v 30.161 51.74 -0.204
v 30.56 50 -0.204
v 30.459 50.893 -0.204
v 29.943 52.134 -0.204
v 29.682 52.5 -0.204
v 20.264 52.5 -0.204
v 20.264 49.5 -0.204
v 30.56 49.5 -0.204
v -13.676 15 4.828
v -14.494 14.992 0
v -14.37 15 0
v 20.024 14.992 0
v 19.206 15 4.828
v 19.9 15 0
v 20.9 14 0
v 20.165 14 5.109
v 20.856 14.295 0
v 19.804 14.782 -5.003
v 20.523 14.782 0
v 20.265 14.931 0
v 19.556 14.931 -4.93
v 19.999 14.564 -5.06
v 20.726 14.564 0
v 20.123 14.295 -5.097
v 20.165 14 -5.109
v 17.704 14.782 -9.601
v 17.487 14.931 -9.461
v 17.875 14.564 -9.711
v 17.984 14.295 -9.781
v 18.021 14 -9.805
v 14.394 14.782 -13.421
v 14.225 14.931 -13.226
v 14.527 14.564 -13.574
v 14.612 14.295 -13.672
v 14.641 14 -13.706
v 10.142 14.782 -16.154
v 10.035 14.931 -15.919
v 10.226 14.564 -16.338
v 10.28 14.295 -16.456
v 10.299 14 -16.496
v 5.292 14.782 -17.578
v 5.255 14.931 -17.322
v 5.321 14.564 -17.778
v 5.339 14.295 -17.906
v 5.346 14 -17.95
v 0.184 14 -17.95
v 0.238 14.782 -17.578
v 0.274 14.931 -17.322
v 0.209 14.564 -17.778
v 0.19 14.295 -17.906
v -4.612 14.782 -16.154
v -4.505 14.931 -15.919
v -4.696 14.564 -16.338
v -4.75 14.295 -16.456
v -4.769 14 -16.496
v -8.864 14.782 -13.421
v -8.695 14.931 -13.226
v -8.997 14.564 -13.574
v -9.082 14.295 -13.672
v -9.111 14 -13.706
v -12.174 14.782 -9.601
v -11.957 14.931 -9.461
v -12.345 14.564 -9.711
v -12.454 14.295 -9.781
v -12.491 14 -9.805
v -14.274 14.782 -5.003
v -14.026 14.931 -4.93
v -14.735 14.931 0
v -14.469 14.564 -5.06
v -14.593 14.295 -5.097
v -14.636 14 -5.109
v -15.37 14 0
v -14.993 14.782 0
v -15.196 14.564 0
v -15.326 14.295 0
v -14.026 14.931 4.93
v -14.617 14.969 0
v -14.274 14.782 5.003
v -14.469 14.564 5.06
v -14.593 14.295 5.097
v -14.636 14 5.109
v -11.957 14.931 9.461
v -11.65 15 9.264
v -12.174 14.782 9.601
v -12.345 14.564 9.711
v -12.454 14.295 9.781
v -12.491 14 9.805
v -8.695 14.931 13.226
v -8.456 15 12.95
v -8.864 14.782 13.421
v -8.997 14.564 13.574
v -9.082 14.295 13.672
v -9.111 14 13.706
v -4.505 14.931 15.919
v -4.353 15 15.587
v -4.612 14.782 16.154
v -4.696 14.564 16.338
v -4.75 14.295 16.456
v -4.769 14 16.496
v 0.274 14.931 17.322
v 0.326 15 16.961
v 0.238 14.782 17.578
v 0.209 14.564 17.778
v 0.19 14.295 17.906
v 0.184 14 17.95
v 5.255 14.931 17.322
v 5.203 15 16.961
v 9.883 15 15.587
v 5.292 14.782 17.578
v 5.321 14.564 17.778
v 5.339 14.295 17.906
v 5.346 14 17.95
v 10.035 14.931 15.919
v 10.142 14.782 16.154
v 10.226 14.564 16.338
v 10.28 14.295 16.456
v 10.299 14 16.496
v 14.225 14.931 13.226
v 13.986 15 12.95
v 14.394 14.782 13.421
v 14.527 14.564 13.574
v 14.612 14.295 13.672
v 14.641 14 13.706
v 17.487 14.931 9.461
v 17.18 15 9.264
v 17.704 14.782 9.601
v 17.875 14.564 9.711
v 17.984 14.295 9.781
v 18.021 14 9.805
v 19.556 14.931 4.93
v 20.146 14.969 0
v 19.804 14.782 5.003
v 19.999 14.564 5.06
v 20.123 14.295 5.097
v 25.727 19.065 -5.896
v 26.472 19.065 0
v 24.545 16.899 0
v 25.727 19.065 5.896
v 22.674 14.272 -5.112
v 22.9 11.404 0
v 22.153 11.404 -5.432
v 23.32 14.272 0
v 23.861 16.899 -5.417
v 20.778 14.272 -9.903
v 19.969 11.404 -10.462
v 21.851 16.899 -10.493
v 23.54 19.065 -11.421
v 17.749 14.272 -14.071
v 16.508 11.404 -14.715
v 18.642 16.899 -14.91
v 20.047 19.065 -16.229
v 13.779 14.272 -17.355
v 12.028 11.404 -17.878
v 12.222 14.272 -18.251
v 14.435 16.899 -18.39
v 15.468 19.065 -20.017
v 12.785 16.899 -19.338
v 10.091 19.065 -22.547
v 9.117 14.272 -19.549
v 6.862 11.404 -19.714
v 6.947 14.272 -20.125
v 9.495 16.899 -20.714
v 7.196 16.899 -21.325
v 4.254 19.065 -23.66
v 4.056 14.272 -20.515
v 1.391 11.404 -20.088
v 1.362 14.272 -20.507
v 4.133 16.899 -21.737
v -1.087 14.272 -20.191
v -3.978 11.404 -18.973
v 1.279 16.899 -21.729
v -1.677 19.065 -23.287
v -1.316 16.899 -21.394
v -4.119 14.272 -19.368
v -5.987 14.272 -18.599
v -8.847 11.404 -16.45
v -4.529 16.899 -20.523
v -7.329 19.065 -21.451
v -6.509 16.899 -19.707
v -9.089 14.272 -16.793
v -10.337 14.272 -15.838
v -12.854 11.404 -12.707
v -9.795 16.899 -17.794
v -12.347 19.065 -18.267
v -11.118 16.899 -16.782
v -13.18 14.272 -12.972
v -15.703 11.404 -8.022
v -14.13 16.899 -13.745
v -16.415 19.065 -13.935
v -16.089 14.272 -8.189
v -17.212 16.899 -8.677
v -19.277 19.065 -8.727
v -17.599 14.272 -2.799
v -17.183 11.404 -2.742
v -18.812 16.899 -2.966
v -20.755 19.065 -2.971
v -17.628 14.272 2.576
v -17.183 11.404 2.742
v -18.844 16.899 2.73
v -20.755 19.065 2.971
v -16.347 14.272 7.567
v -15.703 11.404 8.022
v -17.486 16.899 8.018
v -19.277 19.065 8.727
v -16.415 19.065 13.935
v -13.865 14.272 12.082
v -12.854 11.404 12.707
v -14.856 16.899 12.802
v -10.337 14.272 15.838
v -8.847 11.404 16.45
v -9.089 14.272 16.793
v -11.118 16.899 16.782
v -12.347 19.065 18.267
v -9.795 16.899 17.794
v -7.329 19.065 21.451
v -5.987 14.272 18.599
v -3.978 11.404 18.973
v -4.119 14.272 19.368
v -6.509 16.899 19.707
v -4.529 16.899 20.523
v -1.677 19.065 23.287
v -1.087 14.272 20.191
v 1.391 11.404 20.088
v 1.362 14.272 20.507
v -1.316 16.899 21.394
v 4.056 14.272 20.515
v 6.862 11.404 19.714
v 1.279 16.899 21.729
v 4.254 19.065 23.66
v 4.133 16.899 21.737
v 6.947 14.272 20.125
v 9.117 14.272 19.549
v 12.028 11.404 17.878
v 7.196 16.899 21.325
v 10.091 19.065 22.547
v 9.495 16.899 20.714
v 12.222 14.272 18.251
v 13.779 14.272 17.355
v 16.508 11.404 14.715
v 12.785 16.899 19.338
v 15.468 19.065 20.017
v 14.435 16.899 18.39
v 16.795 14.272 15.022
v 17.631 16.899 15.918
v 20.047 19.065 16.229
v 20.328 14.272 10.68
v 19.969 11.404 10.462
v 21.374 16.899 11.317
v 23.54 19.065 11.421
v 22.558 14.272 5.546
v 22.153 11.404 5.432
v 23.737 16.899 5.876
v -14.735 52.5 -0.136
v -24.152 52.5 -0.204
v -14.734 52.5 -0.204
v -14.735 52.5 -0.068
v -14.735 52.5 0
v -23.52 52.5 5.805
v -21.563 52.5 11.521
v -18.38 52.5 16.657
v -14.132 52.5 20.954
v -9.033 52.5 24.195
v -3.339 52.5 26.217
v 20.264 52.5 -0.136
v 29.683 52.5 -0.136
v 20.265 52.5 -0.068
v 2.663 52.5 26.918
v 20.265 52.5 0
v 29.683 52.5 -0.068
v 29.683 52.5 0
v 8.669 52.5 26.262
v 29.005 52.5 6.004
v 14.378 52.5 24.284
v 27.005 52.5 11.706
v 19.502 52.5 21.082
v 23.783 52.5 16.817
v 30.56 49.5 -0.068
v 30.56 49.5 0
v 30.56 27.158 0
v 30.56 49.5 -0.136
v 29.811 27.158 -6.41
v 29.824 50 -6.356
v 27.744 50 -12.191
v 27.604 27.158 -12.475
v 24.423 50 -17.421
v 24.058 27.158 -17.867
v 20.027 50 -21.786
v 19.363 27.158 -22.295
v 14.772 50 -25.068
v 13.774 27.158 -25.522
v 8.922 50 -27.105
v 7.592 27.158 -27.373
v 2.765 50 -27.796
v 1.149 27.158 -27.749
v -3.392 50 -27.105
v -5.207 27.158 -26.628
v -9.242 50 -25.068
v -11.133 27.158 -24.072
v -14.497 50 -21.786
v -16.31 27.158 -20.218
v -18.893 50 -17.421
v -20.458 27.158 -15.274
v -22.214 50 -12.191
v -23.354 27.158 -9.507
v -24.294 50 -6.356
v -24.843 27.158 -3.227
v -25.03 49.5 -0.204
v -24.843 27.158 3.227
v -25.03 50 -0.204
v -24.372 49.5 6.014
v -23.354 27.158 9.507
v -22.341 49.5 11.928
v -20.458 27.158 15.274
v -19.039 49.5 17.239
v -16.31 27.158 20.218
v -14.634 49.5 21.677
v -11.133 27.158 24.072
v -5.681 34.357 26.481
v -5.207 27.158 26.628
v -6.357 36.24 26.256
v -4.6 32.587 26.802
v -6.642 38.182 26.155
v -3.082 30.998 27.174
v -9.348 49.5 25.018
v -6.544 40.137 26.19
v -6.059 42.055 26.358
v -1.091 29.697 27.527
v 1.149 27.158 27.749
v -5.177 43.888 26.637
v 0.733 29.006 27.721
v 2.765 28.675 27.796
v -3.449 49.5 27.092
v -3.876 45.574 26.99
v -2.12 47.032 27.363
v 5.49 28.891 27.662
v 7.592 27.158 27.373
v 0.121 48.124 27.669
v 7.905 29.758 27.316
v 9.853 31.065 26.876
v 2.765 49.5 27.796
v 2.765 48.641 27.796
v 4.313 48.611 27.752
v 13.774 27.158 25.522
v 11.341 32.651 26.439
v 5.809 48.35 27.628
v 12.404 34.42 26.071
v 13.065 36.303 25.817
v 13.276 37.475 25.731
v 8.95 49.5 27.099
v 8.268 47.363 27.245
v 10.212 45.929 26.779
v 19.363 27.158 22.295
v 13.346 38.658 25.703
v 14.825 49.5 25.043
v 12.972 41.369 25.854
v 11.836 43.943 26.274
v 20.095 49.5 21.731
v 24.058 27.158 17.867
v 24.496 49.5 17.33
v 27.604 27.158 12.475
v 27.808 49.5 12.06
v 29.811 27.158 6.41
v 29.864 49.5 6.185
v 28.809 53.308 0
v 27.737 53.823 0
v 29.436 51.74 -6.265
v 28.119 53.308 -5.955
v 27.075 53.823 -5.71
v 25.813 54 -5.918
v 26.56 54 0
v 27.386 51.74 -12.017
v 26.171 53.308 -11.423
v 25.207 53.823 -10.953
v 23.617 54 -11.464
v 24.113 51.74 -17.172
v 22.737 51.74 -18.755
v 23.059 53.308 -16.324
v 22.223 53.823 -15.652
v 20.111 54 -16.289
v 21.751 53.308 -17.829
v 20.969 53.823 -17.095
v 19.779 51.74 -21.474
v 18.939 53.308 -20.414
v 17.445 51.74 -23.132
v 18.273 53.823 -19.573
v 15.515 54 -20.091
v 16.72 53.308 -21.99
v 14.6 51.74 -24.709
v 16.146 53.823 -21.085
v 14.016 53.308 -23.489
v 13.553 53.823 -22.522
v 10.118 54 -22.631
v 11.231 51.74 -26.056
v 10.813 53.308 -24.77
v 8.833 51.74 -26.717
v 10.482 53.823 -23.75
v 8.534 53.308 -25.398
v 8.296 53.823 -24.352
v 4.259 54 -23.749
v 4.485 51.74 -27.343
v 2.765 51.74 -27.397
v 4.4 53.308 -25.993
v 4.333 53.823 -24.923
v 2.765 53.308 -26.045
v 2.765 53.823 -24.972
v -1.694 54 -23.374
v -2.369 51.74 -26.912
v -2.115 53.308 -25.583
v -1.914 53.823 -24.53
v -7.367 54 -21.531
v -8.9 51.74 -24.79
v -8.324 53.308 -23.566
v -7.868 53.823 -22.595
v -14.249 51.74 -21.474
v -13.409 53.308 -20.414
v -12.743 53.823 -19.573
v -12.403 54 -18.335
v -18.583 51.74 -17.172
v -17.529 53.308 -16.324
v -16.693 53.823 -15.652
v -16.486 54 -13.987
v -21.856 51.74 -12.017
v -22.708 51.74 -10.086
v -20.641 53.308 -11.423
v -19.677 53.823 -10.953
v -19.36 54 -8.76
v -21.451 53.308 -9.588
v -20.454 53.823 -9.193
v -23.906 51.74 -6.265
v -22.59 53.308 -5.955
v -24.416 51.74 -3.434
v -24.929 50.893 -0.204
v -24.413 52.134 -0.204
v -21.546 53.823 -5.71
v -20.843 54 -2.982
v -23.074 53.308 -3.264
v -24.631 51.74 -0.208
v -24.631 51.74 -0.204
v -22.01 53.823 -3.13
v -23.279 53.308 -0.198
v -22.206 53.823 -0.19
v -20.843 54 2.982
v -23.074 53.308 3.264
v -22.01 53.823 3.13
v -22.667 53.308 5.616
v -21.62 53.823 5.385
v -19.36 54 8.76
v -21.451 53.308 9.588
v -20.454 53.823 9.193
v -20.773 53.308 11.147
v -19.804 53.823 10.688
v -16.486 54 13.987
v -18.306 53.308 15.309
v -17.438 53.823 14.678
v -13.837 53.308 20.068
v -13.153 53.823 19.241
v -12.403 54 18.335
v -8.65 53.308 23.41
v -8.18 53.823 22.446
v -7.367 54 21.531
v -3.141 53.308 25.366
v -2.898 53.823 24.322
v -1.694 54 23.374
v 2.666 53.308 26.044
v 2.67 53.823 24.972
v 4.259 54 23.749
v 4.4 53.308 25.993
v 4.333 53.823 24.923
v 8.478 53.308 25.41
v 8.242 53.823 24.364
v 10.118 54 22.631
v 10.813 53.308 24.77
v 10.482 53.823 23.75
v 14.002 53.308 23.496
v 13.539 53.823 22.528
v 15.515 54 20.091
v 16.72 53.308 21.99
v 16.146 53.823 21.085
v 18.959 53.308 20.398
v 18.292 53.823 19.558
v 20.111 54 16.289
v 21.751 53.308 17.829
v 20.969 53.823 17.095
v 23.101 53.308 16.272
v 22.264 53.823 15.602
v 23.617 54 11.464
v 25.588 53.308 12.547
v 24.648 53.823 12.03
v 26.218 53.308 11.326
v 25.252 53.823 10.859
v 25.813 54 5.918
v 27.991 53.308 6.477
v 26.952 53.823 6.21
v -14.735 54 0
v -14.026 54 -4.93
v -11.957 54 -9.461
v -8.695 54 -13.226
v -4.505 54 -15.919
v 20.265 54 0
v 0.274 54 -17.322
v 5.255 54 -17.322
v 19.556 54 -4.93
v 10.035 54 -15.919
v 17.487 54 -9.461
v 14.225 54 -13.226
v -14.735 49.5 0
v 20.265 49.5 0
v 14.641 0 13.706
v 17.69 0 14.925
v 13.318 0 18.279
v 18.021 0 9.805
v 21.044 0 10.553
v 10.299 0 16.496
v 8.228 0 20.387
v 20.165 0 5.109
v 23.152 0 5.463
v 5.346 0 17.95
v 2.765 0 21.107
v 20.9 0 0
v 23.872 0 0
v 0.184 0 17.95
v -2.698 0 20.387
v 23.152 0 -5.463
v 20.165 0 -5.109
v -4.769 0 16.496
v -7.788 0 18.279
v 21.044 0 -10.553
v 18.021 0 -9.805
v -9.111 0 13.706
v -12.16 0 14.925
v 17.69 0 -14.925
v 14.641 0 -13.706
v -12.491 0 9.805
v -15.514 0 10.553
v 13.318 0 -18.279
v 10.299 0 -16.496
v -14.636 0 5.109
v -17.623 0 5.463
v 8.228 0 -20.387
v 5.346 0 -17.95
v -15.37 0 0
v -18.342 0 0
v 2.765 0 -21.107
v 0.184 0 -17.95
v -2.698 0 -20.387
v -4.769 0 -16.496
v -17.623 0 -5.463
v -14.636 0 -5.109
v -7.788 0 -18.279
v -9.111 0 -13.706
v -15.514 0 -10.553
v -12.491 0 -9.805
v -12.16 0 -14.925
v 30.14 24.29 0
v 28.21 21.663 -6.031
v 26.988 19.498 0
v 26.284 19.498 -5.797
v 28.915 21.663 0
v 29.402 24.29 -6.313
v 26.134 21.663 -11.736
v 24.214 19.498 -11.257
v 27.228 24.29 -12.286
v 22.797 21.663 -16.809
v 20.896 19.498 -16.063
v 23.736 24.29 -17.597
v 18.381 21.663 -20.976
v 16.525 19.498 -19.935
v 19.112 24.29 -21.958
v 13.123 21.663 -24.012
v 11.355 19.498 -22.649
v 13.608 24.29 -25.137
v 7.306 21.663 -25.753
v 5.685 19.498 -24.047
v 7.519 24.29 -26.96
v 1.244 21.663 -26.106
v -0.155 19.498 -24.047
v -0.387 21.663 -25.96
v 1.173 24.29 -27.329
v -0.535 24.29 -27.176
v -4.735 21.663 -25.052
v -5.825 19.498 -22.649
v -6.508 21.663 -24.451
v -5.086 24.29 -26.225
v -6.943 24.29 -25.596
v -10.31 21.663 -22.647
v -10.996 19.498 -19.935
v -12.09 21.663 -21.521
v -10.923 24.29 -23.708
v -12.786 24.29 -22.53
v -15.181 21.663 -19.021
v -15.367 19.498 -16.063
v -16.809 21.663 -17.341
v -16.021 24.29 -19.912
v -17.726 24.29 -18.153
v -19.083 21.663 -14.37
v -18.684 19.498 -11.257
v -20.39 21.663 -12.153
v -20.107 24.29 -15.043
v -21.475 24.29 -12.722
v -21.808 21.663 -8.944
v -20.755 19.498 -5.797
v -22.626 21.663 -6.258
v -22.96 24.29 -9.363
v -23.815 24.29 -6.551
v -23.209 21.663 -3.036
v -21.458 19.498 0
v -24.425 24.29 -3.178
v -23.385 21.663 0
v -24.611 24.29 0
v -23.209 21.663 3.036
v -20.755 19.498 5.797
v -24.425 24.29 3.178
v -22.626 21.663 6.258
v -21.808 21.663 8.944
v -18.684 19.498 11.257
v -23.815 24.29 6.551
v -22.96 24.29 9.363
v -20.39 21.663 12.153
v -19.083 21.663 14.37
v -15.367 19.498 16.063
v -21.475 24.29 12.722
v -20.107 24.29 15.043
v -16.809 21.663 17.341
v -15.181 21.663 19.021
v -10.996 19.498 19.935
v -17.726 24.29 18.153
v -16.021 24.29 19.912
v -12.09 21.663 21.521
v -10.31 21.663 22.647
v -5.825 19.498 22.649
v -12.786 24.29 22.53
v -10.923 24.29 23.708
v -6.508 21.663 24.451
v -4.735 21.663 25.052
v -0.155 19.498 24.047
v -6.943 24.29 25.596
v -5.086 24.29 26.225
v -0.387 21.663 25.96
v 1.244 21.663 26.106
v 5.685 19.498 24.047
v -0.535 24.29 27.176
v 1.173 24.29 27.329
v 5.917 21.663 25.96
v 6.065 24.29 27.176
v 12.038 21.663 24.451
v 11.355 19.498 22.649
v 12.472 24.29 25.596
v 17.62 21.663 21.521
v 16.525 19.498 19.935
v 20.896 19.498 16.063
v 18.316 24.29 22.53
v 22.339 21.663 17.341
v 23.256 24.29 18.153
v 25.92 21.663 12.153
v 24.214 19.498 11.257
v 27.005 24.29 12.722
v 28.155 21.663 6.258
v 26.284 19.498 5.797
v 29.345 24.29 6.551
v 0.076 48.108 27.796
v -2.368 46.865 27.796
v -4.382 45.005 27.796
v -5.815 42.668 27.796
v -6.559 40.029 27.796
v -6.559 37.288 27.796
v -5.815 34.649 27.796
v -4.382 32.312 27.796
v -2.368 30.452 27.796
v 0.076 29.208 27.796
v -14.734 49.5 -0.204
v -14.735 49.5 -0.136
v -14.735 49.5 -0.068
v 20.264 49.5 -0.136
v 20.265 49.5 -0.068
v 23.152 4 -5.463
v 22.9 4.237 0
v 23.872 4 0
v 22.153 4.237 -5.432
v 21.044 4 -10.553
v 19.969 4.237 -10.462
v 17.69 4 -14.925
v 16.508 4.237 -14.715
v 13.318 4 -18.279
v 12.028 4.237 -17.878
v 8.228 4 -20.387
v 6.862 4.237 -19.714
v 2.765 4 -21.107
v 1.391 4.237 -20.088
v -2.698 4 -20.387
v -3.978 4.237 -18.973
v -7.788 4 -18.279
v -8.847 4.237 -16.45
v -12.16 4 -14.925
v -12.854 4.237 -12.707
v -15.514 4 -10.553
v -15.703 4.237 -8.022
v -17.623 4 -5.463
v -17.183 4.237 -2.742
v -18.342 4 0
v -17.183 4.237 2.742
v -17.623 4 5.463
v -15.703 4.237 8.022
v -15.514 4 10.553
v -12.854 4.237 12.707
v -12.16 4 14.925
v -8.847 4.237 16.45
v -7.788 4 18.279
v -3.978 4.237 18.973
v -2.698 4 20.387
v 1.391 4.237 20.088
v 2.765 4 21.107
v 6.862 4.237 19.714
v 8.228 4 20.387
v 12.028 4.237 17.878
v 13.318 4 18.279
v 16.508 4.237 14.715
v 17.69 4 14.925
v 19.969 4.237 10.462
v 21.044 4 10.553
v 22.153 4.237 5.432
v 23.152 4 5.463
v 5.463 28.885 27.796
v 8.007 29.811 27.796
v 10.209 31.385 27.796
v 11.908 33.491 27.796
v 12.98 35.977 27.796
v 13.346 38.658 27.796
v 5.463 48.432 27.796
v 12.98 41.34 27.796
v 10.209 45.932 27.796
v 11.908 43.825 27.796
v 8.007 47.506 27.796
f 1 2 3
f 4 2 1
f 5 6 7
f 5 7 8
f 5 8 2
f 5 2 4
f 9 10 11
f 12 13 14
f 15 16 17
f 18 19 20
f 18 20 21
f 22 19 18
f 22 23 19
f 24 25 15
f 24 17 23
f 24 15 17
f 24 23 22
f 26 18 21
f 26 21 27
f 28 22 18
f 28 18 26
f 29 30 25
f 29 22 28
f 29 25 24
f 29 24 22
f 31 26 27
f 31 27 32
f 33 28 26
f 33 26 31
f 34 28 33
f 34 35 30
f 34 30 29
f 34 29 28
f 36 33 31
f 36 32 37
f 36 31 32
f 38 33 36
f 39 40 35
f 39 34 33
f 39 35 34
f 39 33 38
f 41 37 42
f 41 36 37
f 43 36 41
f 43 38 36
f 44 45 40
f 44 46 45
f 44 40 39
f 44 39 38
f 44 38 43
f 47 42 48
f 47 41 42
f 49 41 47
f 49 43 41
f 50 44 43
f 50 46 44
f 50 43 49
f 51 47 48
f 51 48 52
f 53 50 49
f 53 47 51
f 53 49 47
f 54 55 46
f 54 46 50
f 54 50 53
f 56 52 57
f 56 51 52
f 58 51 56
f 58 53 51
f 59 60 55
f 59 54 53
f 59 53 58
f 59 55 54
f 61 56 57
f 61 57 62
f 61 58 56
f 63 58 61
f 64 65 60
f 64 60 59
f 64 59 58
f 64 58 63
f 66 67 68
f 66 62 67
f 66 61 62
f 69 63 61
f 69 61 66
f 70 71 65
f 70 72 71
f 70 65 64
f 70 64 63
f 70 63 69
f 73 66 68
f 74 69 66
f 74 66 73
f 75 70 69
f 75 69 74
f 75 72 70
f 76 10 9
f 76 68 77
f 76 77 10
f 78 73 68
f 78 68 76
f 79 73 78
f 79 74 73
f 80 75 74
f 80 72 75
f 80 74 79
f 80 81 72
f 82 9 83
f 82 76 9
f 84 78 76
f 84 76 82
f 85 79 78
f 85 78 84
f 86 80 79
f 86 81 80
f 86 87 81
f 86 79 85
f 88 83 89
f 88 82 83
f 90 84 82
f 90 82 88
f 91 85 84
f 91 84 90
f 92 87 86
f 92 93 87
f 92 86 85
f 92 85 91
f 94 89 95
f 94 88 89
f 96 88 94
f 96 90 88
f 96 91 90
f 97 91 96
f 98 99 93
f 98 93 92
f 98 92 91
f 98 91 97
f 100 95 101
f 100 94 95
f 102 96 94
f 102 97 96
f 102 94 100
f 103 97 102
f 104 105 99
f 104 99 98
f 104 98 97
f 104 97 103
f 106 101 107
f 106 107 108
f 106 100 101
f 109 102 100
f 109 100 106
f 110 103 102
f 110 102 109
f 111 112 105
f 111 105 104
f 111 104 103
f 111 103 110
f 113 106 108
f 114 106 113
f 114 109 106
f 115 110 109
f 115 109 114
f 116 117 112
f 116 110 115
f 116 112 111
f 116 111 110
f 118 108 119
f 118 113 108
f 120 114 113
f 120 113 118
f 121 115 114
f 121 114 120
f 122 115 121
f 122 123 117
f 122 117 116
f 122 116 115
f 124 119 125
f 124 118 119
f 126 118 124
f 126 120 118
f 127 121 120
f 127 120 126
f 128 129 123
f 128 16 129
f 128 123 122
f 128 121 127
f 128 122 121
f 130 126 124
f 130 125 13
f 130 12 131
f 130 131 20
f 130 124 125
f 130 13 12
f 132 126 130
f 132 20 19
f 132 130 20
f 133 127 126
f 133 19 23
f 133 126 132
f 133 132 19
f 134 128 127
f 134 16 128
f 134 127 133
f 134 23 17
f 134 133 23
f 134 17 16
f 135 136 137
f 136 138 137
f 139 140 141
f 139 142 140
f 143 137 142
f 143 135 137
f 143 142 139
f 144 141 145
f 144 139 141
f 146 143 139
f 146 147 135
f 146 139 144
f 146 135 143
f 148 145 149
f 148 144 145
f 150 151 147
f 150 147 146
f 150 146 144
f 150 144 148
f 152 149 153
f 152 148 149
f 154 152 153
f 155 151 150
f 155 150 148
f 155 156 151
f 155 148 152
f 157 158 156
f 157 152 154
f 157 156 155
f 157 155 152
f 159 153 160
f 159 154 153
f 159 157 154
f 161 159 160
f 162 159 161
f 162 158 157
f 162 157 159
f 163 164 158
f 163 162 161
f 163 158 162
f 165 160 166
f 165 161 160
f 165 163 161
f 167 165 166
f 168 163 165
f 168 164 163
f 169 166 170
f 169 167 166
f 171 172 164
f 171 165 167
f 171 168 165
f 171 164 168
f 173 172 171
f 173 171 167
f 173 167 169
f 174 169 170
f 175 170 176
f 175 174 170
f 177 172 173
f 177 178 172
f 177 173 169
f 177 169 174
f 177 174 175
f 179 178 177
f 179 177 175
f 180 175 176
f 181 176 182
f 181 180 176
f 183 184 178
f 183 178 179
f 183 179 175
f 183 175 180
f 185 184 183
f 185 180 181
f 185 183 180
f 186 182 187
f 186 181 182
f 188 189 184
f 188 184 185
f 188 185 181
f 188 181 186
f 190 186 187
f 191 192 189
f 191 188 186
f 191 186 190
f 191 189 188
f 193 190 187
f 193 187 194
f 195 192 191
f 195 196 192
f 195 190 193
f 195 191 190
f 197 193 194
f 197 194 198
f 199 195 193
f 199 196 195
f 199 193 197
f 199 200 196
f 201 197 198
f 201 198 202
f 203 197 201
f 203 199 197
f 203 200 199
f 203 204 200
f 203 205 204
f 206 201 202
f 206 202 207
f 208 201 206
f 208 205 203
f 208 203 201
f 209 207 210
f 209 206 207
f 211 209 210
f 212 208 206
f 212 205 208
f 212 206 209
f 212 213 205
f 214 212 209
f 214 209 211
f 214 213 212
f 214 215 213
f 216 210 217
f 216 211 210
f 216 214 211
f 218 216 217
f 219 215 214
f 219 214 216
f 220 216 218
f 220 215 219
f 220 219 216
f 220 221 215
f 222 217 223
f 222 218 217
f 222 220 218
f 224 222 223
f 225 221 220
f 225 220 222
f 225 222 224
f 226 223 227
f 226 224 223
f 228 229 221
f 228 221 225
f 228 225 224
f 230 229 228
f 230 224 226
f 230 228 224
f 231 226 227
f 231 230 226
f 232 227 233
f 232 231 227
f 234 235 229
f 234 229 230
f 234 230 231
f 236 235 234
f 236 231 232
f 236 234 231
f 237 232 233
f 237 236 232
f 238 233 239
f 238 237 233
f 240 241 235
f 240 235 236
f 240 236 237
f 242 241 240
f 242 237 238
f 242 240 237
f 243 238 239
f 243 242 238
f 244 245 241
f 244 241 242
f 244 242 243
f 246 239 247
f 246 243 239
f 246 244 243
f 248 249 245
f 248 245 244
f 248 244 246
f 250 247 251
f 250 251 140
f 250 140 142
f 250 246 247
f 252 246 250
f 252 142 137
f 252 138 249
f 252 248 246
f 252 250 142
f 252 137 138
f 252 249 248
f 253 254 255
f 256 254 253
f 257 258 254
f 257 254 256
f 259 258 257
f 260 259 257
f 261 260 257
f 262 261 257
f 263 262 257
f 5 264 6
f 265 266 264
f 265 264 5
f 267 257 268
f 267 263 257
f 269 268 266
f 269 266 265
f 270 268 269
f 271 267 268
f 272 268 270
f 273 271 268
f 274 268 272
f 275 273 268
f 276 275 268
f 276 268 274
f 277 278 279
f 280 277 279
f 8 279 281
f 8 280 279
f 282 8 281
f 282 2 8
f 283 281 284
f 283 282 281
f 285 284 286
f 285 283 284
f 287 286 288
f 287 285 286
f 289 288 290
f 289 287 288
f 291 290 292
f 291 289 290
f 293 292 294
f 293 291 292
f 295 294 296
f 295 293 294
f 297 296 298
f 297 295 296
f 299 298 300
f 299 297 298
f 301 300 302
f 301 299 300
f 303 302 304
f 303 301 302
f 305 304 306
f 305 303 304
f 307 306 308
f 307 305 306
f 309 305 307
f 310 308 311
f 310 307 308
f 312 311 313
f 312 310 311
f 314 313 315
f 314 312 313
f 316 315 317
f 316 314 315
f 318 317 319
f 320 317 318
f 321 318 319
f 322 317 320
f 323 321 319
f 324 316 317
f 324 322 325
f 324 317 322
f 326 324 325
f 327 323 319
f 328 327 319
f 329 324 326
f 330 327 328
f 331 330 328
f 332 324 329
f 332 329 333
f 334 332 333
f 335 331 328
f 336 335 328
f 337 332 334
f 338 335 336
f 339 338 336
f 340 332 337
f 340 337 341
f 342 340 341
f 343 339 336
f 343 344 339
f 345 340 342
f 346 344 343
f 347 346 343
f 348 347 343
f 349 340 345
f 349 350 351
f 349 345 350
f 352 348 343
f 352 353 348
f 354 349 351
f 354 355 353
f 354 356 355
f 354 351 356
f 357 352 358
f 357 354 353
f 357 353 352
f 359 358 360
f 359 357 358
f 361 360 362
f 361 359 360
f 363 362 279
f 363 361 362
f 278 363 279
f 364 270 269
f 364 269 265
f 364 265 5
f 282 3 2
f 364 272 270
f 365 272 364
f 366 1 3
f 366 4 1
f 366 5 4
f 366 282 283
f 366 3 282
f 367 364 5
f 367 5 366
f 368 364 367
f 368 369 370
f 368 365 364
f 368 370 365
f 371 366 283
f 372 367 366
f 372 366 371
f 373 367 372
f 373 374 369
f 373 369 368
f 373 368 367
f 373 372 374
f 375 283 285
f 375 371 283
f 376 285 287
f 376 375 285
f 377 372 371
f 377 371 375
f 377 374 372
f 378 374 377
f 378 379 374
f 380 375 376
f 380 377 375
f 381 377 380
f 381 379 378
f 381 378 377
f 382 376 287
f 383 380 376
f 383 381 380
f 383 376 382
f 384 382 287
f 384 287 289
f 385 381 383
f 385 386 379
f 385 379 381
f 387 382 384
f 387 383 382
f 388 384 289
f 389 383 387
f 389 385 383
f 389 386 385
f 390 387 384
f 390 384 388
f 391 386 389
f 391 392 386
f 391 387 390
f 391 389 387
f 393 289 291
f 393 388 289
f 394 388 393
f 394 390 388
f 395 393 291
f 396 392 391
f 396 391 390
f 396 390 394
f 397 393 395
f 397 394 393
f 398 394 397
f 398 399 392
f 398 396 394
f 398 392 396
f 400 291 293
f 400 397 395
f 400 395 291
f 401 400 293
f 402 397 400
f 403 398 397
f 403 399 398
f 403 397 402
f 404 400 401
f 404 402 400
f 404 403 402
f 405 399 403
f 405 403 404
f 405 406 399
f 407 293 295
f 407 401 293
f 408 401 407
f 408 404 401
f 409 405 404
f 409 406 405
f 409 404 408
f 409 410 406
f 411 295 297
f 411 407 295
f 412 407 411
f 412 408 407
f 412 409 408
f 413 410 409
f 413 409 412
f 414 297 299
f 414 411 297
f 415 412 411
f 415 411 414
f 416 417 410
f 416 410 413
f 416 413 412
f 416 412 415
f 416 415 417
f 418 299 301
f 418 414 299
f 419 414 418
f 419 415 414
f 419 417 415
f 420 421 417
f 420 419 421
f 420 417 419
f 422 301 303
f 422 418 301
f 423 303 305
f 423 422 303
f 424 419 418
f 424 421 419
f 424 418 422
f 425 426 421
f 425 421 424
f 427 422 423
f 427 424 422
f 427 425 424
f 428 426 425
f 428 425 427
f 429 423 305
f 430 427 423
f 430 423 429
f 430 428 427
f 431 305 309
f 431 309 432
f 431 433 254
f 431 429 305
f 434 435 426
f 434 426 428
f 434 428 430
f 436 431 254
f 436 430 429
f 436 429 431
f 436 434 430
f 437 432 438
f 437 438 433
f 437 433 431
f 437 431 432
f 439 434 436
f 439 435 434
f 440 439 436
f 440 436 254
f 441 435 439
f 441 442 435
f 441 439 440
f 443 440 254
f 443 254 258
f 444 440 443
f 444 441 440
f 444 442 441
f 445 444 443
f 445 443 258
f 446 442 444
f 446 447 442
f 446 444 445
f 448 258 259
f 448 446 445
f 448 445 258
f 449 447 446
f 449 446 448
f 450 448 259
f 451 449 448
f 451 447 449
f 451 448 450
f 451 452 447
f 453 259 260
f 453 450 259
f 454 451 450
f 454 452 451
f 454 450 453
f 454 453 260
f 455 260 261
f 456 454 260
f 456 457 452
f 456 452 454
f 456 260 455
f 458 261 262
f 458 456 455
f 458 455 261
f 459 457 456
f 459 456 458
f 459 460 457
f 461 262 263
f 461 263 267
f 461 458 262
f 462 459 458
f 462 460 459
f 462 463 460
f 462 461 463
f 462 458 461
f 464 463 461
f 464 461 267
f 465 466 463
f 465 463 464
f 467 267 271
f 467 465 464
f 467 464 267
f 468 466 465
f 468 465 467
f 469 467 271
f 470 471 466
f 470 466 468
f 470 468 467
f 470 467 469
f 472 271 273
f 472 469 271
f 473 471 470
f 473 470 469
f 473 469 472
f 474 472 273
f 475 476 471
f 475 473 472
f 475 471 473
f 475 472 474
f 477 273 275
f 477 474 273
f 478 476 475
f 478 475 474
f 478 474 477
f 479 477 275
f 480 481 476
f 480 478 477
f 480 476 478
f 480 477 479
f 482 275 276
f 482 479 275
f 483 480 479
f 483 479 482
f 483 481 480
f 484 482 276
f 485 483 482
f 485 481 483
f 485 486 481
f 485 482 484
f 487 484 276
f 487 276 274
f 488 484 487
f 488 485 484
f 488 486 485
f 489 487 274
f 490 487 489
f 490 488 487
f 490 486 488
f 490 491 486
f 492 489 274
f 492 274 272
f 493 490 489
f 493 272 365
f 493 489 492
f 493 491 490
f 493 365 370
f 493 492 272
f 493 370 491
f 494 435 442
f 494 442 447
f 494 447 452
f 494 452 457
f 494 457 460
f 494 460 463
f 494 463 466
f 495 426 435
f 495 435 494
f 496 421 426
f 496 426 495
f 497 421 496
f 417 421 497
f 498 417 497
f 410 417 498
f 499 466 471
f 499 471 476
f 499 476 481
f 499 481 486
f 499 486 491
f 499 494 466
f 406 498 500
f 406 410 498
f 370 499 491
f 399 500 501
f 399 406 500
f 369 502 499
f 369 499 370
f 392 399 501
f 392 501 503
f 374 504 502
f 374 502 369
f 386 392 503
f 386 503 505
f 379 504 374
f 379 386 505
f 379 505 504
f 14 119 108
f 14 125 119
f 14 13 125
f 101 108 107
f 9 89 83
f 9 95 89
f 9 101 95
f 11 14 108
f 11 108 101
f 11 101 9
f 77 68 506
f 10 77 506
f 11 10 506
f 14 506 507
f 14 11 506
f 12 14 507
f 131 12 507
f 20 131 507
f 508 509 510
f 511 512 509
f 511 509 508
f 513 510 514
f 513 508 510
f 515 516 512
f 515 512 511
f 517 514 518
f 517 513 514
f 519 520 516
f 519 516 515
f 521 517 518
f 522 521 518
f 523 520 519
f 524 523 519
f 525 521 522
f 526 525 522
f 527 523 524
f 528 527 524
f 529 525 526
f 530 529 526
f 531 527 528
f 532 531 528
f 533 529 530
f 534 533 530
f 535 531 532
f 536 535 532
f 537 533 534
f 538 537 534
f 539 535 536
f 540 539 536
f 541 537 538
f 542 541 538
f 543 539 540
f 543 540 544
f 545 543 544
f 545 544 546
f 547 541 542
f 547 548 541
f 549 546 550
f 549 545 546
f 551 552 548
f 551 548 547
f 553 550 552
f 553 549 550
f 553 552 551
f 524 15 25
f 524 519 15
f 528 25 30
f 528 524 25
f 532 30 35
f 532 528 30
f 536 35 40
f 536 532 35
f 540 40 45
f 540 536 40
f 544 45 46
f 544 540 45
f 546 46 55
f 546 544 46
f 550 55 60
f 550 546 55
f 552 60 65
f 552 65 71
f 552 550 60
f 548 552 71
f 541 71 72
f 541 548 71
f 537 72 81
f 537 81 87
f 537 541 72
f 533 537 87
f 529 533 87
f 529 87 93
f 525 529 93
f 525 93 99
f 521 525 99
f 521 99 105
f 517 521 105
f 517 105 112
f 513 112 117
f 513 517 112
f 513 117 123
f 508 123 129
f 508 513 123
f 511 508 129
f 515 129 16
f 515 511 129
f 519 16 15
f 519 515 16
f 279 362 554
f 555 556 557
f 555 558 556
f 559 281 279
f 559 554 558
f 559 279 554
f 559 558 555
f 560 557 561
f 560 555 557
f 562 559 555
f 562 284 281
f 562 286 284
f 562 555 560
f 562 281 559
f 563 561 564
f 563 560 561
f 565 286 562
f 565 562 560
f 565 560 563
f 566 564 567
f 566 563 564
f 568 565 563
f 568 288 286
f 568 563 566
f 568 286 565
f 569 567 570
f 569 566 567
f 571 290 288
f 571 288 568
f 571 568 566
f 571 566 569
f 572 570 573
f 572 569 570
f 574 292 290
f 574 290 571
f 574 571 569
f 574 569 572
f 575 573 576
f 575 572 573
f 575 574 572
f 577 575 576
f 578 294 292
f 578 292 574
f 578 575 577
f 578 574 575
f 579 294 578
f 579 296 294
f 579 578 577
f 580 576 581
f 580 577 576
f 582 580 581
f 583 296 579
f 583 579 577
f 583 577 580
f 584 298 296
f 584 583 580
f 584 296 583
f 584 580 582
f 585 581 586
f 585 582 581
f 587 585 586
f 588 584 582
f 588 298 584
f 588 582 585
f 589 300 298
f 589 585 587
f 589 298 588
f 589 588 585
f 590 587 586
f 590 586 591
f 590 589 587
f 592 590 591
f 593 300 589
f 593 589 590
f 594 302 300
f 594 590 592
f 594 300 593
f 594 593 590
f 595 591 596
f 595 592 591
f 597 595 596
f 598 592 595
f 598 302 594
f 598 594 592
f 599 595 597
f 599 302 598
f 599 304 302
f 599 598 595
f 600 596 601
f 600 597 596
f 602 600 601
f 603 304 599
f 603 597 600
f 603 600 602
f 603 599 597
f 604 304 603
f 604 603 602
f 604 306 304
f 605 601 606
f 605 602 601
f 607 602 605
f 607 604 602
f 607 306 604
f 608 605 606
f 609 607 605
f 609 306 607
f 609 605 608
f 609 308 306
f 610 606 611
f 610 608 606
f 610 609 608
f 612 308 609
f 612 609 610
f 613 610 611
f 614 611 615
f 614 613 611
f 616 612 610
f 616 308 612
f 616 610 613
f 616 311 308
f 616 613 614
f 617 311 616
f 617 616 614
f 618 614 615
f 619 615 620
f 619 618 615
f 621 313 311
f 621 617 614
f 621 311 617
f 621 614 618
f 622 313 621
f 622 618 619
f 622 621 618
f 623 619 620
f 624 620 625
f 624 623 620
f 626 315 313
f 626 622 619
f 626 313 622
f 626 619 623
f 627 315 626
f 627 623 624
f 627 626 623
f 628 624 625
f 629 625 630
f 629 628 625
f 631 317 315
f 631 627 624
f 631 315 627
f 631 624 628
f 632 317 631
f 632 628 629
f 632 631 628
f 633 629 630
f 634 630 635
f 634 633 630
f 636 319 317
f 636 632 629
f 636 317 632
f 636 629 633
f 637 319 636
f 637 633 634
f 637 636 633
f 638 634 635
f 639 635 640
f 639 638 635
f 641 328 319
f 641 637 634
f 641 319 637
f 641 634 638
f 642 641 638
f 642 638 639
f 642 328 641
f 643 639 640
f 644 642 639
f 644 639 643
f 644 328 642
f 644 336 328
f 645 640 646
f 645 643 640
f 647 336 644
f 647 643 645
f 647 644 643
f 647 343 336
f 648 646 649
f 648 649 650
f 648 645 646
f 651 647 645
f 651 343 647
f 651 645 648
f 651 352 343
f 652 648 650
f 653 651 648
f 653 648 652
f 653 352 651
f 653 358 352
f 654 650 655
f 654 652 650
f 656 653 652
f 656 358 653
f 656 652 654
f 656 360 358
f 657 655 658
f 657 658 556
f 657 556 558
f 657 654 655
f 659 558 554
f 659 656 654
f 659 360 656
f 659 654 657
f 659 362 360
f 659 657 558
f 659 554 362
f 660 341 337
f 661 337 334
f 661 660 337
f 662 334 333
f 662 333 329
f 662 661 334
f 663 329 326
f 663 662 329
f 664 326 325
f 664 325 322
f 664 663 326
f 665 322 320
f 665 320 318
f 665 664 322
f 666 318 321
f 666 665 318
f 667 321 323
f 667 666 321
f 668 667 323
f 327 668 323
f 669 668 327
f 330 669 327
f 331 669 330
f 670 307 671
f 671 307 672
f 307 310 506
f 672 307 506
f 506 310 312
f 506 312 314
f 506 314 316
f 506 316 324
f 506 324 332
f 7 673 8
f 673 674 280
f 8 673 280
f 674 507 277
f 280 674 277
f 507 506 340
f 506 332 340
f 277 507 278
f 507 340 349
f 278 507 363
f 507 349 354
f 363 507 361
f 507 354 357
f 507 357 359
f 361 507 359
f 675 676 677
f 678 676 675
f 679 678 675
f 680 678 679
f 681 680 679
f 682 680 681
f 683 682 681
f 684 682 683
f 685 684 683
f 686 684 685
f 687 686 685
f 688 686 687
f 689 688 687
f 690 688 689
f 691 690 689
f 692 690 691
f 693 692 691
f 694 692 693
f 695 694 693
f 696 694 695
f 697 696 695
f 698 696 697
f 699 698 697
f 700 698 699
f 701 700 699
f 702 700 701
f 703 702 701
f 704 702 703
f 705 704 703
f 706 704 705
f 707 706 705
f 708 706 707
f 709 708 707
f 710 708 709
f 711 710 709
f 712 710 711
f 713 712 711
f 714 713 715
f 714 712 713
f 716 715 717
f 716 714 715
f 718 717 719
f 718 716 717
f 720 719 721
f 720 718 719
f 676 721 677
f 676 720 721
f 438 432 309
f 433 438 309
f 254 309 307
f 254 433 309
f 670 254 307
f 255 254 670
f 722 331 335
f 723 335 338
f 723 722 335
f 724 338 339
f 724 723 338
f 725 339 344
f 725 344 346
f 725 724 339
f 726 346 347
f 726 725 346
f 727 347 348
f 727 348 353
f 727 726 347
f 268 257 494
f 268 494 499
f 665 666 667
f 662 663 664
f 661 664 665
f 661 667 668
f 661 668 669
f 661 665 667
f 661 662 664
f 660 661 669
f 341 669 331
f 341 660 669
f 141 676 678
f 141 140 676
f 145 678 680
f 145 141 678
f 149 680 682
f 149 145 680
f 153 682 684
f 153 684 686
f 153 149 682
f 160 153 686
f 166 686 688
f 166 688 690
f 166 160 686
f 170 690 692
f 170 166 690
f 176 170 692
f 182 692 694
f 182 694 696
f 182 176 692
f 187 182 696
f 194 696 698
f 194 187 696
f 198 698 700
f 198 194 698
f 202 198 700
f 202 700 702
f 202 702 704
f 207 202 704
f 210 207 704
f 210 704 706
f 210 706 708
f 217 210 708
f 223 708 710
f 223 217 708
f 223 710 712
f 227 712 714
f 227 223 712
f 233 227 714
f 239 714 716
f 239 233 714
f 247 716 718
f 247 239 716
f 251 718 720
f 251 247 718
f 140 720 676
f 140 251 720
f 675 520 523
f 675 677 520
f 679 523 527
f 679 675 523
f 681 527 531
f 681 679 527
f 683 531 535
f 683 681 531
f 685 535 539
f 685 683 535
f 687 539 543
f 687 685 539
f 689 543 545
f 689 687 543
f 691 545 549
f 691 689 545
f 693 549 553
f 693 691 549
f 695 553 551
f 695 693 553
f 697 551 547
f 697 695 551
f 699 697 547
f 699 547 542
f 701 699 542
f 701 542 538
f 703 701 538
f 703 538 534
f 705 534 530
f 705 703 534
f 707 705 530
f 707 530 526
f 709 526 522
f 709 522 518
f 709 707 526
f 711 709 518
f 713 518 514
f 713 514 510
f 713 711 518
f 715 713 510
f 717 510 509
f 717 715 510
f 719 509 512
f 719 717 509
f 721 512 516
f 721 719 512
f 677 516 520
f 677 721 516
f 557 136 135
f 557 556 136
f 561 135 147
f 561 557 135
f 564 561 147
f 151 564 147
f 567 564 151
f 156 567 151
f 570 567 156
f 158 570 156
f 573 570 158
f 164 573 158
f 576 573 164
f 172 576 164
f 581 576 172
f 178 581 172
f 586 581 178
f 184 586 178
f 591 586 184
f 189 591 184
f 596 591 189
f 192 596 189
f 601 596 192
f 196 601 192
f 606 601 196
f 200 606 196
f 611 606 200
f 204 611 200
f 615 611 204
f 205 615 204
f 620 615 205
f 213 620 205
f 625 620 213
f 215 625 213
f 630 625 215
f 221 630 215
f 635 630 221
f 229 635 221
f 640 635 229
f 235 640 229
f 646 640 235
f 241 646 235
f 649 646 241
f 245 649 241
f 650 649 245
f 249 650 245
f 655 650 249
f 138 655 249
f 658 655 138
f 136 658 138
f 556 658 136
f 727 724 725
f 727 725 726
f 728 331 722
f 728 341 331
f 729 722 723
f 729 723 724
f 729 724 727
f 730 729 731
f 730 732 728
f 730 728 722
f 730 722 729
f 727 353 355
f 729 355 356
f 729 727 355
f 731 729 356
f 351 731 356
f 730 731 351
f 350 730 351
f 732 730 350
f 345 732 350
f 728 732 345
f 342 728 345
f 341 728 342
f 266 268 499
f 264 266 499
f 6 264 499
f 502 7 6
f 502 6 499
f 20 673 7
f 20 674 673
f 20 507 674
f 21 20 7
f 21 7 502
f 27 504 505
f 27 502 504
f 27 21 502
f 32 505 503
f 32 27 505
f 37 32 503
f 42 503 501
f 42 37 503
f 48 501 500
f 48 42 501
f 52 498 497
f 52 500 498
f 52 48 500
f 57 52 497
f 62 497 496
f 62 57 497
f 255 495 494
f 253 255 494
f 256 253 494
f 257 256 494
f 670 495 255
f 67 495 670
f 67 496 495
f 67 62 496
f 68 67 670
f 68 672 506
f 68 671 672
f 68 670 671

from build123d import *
from build123d.topology import SkipClean

# Parameters (mm, degrees)
SKETCH10_R              = 10
BOSS_EXTRUDE1_DEPTH     = 5
CUT_EXTRUDE3_DEPTH      = 45
CUT_EXTRUDE3_DEPTH_BACK = 20
SKETCH12_W              = 60
SKETCH12_H              = 3
CUT_EXTRUDE4_DEPTH      = 28


with BuildPart() as part:
    # Sketch1 → Revolve1 (revolve)
    with BuildSketch(Plane.XY):
        with BuildLine():
            Line((20.9, 0), (23.871591838, 0))
            Line((23.871591838, 0), (23.871591838, 4))
            Line((23.871591838, 4), (22.9, 4.236662843))
            Line((22.9, 4.236662843), (22.9, 11.404308102))
            ThreePointArc((22.9, 11.404308102), (23.83692213, 15.63049072), (26.472123903, 19.064752533))
            Line((26.472123903, 19.064752533), (26.988320528, 19.497892931))
            ThreePointArc((26.988320528, 19.497892931), (29.623522302, 22.932154745), (30.560444431, 27.158337362))
            Line((30.560444431, 27.158337362), (30.560444431, 50))
            ThreePointArc((30.560444431, 50), (29.388871556, 52.828427125), (26.560444431, 54))
            Line((26.560444431, 54), (2.764914955, 54))
            Line((2.764914955, 54), (2.764914955, 15))
            Line((2.764914955, 15), (19.9, 15))
            ThreePointArc((19.9, 15), (20.607106781, 14.707106781), (20.9, 14))
            Line((20.9, 14), (20.9, 0))
        make_face()
    revolve(axis=Axis((2.764914955, 7.821821657, 0), (0, 1, 0)))

    # Sketch10 → Boss-Extrude1 (add)
    with SkipClean():  # the faces are left unmerged after this step: merging them gives an invalid solid
        with BuildSketch(Plane.XY.offset(27.795529476)):
            with Locations((3.346345887, 38.658337362)):
                Circle(SKETCH10_R)
        extrude(amount=-BOSS_EXTRUDE1_DEPTH)

    # Sketch11 → Cut-Extrude3 (cut, two sides: drawn at the far end of the back side and taken through both)
    with SkipClean():  # the faces are left unmerged after this step: merging them gives an invalid solid
        with BuildSketch(Plane(origin=(0, 17, 0), x_dir=(1, 0, 0), z_dir=(0, 1, 0)).offset(-CUT_EXTRUDE3_DEPTH_BACK)):
            with BuildLine():
                Line((-14.735085045, 0), (20.264914955, 0))
                ThreePointArc((20.264914955, 0), (2.764914955, 17.5), (-14.735085045, 0))
            make_face()
        extrude(amount=CUT_EXTRUDE3_DEPTH + CUT_EXTRUDE3_DEPTH_BACK, mode=Mode.SUBTRACT)

    # Sketch12 → Cut-Extrude4 (cut)
    with SkipClean():  # the faces are left unmerged after this step: merging them gives an invalid solid
        with BuildSketch(Plane.XY.offset(27.795529476)):
            with Locations((3.002856973, 51)):
                Rectangle(SKETCH12_W, SKETCH12_H)
        extrude(amount=-CUT_EXTRUDE4_DEPTH, mode=Mode.SUBTRACT)


solid = part.part
